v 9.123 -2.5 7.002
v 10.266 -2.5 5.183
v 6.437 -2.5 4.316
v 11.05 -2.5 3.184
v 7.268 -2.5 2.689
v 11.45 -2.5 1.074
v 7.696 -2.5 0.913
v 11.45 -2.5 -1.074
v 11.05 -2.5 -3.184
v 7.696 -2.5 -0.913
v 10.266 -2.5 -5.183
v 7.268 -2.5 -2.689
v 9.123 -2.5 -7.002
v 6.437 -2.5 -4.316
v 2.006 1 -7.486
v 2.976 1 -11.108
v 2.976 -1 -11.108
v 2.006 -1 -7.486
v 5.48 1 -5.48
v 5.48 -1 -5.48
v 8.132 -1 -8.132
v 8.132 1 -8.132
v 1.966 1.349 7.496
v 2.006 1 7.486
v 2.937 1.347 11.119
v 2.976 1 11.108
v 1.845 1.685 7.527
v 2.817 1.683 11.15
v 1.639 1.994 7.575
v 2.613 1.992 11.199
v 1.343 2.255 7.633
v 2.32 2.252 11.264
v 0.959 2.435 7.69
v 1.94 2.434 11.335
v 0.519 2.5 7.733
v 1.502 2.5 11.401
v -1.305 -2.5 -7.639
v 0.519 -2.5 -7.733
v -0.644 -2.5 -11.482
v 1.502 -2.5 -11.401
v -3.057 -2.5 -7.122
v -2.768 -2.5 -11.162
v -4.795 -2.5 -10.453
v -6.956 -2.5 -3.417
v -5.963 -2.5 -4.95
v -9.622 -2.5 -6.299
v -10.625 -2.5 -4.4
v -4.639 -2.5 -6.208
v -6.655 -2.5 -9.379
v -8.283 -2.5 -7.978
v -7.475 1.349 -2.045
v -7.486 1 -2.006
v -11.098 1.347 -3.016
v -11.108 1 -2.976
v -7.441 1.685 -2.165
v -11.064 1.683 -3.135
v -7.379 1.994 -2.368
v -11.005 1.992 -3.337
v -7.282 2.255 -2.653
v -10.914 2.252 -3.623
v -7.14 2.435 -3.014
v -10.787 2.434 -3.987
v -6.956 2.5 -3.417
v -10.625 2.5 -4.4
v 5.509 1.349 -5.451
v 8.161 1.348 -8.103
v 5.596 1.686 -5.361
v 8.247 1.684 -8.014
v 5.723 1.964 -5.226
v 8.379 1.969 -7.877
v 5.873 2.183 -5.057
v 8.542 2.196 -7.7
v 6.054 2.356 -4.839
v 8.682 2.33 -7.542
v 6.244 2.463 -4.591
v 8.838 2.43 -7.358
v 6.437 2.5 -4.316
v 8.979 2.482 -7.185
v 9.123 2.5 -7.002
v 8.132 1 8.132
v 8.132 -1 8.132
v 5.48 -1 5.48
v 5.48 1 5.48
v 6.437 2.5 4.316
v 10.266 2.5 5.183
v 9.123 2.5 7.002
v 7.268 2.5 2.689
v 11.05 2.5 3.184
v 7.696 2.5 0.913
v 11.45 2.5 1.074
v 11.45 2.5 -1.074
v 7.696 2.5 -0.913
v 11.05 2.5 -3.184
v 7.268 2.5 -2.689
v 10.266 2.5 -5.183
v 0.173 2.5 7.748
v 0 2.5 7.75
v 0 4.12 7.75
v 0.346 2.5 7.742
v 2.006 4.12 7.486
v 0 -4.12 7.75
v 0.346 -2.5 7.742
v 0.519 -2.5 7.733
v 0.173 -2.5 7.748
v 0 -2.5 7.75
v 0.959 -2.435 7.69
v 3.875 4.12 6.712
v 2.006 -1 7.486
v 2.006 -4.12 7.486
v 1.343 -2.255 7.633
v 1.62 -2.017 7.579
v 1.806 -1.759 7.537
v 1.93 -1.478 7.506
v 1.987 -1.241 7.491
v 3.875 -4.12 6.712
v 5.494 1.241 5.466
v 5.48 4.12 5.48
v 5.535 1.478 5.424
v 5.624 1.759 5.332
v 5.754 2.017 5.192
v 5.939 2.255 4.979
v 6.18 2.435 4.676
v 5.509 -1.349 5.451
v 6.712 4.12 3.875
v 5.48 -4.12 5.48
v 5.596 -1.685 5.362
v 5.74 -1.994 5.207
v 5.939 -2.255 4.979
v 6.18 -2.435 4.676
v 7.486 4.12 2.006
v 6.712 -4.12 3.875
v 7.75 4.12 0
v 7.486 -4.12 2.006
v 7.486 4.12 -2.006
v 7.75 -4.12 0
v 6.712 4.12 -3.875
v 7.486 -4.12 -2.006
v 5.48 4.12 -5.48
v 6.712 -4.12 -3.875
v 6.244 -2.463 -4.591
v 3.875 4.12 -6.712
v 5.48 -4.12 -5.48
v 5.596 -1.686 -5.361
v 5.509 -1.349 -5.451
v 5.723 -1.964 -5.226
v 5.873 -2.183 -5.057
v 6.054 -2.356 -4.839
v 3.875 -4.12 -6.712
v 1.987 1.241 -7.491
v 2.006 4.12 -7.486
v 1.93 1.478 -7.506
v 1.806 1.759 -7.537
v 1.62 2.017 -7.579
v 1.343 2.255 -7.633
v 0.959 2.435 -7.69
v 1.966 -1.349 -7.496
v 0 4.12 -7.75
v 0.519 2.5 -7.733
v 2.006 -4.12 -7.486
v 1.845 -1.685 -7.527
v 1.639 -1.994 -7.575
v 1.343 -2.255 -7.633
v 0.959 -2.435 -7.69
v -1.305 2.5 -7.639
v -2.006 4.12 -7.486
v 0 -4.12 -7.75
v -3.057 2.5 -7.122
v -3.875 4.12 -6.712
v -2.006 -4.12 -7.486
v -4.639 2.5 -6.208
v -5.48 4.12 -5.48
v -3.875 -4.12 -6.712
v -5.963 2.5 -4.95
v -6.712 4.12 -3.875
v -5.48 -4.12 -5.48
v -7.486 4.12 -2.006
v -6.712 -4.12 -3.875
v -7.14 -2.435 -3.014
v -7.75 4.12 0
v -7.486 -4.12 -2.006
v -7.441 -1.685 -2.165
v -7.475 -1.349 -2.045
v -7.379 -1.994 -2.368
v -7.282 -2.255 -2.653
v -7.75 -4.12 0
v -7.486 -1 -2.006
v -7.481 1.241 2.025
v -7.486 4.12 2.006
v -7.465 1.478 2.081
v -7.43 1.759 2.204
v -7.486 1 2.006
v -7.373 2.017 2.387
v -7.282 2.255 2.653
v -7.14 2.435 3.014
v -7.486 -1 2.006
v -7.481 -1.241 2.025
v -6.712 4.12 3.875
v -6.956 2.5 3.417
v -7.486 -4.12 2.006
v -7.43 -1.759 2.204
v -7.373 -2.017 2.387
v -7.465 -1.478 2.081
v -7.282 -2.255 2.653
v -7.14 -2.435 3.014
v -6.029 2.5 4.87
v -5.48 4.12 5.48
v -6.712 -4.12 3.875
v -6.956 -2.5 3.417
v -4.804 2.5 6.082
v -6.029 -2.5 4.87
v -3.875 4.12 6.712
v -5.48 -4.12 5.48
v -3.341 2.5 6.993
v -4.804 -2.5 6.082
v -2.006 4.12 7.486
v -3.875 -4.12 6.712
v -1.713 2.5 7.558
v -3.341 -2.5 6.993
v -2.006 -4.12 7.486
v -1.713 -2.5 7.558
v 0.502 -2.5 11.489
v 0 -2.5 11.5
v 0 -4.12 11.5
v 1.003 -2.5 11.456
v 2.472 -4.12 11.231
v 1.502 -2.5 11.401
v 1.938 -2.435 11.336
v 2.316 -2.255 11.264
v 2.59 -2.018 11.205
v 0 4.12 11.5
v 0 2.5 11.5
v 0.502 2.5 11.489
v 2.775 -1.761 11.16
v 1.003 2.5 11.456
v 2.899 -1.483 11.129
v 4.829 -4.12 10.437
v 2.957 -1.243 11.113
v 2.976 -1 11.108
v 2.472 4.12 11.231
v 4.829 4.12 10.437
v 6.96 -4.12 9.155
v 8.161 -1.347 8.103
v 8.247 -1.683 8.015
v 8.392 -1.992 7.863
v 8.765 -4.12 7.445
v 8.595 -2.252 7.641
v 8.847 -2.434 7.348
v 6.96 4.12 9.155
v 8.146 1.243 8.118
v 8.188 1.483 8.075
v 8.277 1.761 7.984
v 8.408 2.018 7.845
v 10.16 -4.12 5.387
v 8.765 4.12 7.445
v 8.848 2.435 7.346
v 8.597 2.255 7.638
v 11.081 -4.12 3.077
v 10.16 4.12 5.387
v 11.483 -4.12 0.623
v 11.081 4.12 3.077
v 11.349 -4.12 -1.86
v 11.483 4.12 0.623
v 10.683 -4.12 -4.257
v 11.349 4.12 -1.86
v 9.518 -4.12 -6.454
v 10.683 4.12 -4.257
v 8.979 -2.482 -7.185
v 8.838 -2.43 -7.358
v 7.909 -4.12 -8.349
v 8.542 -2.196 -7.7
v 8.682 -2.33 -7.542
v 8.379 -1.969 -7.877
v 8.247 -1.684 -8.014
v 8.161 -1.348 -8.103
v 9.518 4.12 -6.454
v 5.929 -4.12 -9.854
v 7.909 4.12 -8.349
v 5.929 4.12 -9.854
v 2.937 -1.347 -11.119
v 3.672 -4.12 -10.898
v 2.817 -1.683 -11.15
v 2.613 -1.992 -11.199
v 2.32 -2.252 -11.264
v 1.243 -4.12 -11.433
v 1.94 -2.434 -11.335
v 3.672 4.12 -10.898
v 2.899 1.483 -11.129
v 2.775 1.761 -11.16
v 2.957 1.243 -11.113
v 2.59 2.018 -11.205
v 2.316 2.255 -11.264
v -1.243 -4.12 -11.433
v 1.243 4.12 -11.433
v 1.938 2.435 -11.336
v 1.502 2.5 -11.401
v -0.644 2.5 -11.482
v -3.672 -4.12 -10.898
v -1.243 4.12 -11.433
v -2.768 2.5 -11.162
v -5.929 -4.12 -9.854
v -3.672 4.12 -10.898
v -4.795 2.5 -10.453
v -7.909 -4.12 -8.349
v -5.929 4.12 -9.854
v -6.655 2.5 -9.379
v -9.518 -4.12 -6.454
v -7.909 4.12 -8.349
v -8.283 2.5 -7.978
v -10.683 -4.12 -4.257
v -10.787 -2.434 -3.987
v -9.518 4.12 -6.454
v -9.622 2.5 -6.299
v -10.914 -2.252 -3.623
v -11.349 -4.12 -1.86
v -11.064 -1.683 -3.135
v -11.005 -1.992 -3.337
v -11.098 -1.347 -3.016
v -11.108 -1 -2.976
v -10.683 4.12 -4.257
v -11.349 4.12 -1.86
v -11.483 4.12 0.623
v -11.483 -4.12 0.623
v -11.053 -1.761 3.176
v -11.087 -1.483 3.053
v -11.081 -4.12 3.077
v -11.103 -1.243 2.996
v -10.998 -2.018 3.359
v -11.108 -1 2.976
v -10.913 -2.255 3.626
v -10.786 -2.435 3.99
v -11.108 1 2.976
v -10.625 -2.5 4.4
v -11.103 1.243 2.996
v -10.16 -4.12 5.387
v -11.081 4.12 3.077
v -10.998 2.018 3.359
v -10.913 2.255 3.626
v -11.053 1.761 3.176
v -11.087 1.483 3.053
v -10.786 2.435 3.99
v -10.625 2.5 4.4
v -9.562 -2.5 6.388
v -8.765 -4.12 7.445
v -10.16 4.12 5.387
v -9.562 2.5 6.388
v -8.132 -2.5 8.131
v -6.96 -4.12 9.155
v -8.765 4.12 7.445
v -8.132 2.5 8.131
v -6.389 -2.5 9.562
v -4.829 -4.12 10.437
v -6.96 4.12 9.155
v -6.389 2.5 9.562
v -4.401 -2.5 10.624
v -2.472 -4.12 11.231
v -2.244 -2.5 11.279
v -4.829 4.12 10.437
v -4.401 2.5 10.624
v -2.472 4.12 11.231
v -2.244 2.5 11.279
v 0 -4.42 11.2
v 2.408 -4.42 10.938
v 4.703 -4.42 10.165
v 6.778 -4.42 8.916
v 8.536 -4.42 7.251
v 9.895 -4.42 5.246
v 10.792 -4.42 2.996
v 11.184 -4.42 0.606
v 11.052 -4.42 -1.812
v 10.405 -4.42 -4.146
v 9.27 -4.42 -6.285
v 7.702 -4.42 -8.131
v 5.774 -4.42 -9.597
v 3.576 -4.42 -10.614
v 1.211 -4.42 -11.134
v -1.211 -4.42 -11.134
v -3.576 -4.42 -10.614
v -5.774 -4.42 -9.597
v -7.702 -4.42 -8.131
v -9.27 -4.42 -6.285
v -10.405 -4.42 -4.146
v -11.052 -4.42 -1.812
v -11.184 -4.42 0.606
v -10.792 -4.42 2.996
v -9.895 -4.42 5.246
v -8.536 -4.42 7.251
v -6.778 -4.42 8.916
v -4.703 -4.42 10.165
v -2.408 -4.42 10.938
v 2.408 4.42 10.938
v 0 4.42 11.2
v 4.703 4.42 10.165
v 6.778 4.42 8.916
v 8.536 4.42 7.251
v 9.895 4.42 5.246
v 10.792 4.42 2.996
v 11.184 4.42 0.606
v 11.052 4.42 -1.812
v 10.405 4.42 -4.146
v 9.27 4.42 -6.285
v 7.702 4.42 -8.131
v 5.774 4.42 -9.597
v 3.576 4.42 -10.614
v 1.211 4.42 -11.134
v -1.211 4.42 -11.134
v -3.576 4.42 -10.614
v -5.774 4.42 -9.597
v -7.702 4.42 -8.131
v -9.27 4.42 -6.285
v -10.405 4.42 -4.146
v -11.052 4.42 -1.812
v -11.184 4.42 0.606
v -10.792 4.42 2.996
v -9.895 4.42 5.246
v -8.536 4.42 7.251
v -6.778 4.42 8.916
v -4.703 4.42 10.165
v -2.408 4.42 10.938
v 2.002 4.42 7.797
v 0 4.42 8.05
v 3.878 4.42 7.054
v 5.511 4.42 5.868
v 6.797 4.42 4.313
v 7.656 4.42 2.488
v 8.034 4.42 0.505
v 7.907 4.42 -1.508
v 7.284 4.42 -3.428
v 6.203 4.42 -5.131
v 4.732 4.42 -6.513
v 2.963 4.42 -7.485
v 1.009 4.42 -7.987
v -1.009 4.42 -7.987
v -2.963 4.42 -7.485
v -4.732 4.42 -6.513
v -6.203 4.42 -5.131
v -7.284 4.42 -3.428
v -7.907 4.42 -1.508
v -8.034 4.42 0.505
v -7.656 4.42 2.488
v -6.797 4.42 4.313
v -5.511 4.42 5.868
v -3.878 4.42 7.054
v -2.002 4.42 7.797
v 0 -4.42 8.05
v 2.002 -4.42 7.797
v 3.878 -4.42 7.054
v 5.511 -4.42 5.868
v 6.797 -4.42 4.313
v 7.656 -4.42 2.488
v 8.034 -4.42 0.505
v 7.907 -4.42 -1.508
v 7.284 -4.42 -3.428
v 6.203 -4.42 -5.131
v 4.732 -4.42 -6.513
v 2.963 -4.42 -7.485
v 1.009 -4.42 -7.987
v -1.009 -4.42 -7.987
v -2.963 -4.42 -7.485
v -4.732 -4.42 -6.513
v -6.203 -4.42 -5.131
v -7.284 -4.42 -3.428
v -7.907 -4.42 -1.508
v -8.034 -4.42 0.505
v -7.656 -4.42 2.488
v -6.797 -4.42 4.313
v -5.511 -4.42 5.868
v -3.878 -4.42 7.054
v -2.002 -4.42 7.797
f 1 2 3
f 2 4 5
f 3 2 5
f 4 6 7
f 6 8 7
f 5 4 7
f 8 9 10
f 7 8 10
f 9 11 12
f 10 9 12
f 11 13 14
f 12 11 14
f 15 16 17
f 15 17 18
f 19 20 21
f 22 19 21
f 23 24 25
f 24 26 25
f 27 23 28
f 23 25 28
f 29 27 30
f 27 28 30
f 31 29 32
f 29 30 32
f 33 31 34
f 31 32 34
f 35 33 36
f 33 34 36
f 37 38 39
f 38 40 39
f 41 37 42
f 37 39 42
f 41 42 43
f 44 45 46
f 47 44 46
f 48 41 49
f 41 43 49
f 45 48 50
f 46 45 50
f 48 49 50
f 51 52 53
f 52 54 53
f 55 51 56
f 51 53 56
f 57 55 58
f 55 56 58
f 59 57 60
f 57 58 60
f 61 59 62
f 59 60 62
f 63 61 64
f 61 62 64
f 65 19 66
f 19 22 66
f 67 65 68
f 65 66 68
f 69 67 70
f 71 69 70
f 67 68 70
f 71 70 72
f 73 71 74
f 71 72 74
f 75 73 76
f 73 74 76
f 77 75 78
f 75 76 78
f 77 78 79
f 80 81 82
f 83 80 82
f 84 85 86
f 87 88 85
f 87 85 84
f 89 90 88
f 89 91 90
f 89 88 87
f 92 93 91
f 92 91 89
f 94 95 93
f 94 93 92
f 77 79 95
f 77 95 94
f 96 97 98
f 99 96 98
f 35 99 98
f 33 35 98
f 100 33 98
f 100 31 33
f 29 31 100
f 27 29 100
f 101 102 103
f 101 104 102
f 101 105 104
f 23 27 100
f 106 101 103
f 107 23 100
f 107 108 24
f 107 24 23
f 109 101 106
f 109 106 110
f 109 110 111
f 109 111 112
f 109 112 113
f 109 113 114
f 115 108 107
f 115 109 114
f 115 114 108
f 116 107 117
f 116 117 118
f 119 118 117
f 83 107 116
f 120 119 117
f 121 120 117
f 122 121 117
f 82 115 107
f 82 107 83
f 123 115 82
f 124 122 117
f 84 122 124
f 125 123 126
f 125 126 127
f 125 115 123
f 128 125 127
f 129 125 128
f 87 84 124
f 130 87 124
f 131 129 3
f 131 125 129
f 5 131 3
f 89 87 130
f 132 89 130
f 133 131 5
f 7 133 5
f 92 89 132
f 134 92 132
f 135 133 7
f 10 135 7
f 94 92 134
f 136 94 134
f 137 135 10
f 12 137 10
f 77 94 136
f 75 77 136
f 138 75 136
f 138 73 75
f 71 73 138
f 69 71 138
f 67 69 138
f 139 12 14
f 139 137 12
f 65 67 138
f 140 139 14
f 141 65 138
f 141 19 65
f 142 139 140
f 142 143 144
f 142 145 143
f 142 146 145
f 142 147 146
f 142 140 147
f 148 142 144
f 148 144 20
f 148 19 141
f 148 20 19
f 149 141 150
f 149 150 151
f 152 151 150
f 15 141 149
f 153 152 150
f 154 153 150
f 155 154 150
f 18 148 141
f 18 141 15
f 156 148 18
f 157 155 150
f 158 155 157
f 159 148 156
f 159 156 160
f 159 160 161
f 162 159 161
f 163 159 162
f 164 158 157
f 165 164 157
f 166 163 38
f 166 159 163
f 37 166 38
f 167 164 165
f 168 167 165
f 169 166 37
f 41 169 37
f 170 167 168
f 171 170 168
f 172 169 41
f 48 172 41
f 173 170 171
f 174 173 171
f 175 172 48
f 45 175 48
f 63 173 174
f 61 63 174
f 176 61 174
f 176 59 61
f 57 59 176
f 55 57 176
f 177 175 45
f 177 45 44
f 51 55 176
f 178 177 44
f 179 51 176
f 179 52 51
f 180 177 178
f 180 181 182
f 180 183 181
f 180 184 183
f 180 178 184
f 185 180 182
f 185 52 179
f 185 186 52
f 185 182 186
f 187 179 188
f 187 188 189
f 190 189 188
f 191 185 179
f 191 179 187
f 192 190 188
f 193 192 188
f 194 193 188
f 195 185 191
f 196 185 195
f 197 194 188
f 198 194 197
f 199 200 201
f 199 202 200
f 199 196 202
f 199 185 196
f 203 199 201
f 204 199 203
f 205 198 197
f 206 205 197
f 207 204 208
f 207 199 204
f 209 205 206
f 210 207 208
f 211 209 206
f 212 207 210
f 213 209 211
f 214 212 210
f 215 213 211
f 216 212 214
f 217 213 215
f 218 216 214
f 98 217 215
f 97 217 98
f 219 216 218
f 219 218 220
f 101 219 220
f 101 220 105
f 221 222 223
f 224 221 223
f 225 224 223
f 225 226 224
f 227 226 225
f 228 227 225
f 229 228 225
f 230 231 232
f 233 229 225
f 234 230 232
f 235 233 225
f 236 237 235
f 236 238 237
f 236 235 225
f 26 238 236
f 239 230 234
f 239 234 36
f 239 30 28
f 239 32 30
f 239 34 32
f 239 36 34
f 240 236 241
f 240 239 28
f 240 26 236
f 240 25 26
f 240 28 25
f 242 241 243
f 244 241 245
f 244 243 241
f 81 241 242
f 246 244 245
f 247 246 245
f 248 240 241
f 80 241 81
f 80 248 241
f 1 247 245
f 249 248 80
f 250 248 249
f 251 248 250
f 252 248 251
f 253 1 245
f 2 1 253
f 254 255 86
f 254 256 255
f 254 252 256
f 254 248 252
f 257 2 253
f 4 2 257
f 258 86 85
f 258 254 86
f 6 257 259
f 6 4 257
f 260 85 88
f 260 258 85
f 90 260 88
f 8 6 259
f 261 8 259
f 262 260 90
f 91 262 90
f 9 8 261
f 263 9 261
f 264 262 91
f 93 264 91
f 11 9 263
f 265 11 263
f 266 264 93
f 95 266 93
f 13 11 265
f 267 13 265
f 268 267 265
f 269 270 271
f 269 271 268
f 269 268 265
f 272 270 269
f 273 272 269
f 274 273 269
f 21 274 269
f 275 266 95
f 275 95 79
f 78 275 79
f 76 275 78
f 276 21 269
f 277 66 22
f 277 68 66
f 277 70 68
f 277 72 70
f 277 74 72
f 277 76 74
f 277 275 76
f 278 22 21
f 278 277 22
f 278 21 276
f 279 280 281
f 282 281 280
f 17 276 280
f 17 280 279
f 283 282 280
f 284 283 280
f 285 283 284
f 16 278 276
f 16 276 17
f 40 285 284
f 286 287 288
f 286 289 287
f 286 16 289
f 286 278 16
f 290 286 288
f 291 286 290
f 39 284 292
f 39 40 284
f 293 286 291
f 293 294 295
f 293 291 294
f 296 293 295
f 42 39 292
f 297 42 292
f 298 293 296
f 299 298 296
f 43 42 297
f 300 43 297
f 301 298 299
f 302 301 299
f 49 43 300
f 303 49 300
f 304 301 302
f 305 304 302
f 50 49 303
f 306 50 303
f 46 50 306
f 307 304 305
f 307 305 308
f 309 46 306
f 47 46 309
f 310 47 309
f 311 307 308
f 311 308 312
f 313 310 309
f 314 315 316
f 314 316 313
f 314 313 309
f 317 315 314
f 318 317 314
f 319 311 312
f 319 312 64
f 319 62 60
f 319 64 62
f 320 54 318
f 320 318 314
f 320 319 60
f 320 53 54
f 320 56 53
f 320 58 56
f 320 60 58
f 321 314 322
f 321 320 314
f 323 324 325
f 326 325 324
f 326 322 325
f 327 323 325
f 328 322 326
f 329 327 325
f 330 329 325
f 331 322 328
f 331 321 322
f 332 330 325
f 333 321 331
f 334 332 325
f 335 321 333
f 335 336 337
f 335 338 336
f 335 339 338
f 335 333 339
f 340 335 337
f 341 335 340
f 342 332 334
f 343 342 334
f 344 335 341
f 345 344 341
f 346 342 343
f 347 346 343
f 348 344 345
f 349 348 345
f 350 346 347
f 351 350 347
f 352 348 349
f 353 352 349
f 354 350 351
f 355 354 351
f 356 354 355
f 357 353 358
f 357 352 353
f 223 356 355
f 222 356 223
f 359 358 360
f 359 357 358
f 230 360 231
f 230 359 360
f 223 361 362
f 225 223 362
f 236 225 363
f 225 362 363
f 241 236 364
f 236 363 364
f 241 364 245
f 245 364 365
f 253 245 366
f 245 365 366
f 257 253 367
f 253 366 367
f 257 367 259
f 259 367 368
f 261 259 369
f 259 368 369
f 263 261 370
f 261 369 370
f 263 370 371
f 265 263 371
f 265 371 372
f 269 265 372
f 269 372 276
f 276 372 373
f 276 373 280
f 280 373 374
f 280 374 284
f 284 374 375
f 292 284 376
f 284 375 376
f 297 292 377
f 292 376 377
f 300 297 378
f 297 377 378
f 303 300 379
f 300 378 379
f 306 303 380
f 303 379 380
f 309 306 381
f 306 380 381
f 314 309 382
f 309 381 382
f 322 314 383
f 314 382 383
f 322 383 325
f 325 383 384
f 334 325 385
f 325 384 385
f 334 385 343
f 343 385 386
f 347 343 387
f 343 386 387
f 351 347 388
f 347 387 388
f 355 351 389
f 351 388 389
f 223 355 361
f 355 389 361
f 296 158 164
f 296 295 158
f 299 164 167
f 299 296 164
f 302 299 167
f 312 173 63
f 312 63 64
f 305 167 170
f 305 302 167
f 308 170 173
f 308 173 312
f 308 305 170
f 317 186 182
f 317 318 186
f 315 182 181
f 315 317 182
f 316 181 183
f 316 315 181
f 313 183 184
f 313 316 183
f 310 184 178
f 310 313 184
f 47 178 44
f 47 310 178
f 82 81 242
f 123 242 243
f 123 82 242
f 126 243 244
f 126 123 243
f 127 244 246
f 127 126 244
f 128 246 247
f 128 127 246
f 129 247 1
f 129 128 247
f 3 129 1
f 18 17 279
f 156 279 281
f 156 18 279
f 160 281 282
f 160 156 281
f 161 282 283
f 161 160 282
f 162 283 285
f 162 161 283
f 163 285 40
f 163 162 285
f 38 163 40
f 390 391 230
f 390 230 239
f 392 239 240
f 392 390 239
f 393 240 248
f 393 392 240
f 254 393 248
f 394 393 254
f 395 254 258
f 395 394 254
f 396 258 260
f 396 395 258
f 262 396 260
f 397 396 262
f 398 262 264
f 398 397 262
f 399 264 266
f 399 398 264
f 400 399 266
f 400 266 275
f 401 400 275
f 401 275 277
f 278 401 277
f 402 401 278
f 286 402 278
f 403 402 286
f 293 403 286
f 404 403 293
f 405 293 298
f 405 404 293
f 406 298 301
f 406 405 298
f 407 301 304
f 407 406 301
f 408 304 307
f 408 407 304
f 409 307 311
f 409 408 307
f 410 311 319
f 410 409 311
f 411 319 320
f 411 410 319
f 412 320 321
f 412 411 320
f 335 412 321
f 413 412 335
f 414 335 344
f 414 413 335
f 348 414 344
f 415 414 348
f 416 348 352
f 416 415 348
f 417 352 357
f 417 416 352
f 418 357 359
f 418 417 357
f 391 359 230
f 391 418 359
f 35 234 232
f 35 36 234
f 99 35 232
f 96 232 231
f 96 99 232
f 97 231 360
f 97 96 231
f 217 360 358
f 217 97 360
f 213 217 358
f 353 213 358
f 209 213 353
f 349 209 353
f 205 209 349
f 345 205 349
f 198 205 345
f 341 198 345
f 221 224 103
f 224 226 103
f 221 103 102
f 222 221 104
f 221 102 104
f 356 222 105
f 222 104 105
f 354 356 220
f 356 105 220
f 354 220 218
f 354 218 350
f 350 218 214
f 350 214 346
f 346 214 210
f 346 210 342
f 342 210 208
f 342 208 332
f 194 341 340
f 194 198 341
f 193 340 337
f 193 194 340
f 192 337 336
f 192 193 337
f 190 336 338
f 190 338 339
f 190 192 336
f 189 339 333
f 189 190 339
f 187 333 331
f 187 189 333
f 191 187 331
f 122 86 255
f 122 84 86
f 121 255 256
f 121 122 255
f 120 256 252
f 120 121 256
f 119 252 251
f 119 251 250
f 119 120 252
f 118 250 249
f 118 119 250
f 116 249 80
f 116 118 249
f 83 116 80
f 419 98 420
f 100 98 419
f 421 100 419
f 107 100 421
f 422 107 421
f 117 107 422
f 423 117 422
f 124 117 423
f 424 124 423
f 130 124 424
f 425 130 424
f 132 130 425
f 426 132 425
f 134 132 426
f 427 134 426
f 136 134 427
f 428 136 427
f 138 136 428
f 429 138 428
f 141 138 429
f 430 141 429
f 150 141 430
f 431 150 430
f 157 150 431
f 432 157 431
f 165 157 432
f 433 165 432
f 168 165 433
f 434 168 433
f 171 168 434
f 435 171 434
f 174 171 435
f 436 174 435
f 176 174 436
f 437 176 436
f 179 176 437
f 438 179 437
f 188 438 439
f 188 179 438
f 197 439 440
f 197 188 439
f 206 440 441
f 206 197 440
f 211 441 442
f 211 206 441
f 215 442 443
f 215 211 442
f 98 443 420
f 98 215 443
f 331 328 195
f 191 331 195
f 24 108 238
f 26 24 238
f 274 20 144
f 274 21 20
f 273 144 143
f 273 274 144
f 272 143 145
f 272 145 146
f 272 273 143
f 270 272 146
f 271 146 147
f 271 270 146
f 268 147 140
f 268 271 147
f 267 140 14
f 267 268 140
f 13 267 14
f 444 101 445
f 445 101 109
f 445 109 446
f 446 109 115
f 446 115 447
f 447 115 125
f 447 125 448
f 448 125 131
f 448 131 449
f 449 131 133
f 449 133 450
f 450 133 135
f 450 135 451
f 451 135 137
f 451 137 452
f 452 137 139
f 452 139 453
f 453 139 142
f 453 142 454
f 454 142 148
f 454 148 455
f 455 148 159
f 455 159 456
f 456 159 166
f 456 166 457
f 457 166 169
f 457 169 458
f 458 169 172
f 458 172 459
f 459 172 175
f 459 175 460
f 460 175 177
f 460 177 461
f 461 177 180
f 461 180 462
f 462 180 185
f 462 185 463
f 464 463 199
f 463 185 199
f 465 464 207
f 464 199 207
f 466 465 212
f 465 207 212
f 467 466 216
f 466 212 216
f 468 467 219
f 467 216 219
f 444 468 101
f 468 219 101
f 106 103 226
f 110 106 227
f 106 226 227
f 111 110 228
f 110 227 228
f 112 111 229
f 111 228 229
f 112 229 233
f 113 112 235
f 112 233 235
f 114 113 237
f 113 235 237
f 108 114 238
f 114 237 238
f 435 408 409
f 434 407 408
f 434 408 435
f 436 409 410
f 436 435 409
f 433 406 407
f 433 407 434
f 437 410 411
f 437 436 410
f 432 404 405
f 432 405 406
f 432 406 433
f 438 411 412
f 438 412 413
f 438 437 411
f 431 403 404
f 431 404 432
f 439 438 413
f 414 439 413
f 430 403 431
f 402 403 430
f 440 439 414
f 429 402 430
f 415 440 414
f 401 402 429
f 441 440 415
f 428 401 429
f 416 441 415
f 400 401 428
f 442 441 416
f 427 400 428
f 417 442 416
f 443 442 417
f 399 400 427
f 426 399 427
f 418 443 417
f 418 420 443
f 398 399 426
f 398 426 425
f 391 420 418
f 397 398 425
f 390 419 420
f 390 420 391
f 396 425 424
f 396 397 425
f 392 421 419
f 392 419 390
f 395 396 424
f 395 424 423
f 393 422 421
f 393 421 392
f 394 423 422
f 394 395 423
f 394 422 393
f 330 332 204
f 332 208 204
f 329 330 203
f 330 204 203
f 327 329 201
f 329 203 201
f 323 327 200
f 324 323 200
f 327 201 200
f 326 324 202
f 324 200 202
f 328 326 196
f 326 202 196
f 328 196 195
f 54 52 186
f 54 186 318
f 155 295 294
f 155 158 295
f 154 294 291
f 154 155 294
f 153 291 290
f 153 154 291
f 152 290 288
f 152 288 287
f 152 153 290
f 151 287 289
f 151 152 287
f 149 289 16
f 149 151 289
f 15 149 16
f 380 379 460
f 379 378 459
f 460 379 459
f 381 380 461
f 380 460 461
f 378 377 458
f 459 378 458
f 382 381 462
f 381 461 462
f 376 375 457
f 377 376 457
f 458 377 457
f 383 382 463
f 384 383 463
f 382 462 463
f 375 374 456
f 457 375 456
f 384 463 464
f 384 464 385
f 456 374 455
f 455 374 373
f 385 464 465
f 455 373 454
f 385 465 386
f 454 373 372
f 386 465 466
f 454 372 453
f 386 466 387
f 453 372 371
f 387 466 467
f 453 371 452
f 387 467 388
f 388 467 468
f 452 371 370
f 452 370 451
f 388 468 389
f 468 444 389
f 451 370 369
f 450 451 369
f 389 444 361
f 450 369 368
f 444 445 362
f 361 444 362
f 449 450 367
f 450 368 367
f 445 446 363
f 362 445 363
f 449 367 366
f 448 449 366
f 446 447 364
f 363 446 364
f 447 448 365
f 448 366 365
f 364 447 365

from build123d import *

# Parameters (mm, degrees)
SKETCH1_R           = 11.5
SKETCH1_R_2         = 7.75
BOSS_EXTRUDE1_DEPTH = 4.42
CUT_EXTRUDE1_DEPTH  = 2.5
FILLET1_R           = 1.5
CHAMFER1_SIZE       = 0.3


with BuildPart() as part:
    # Sketch1 → Boss-Extrude1 (new, symmetric)
    with BuildSketch(Plane(origin=(0, 0, 0), x_dir=(1, 0, 0), z_dir=(0, 1, 0))):
        with Locations(Location((0, 0, 0), (0, 0, 270))):
            Circle(SKETCH1_R)
        with Locations(Location((0, 0, 0), (0, 0, 270))):
            Circle(SKETCH1_R_2, mode=Mode.SUBTRACT)
    extrude(amount=BOSS_EXTRUDE1_DEPTH, both=True)

    # Sketch2 → Cut-Extrude1 (cut, symmetric)
    with BuildSketch(Plane(origin=(0, 0, 0), x_dir=(1, 0, 0), z_dir=(0, 1, 0))):
        with BuildLine():
            Line((4.772970773, 4.772970773), (8.838834765, 8.838834765))
            ThreePointArc((8.838834765, 8.838834765), (12.5, 0), (8.838834765, -8.838834765))
            Line((8.838834765, -8.838834765), (4.772970773, -4.772970773))
            ThreePointArc((4.772970773, -4.772970773), (6.75, 0), (4.772970773, 4.772970773))
        make_face()
        with BuildLine():
            Line((1.747028554, -6.519999327), (3.235238064, -12.074072829))
            ThreePointArc((3.235238064, -12.074072829), (-6.25, -10.825317547), (-12.074072829, -3.235238064))
            Line((-12.074072829, -3.235238064), (-6.519999327, -1.747028554))
            ThreePointArc((-6.519999327, -1.747028554), (-3.375, -5.845671476), (1.747028554, -6.519999327))
        make_face()
        with BuildLine():
            Line((-6.519999327, 1.747028554), (-12.074072829, 3.235238064))
            ThreePointArc((-12.074072829, 3.235238064), (-6.25, 10.825317547), (3.235238064, 12.074072829))
            Line((3.235238064, 12.074072829), (1.747028554, 6.519999327))
            ThreePointArc((1.747028554, 6.519999327), (-3.375, 5.845671476), (-6.519999327, 1.747028554))
        make_face()
    extrude(amount=CUT_EXTRUDE1_DEPTH, both=True, mode=Mode.SUBTRACT)

    # Fillet1
    fillet1_edges = [part.edges().sort_by_distance(p)[0] for p in [
        (6.805902769, -2.5, -6.805902769),
        (6.805902769, -2.5, 6.805902769),
        (6.805902769, 2.5, -6.805902769),
        (6.805902769, 2.5, 6.805902769),
        (2.491133309, -2.5, 9.297036078),
        (-9.297036078, -2.5, 2.491133309),
        (2.491133309, 2.5, 9.297036078),
        (-9.297036078, 2.5, 2.491133309),
        (-9.297036078, -2.5, -2.491133309),
        (2.491133309, -2.5, -9.297036078),
        (-9.297036078, 2.5, -2.491133309),
        (2.491133309, 2.5, -9.297036078),
    ]]
    fillet(fillet1_edges, radius=FILLET1_R)

    # Chamfer1
    chamfer1_edges = [part.edges().sort_by_distance(p)[0] for p in [
        (0, -4.42, -11.5),
        (0, 4.42, -11.5),
        (0, -4.42, -7.75),
        (0, 4.42, -7.75),
    ]]
    chamfer(chamfer1_edges, length=CHAMFER1_SIZE)


solid = part.part
